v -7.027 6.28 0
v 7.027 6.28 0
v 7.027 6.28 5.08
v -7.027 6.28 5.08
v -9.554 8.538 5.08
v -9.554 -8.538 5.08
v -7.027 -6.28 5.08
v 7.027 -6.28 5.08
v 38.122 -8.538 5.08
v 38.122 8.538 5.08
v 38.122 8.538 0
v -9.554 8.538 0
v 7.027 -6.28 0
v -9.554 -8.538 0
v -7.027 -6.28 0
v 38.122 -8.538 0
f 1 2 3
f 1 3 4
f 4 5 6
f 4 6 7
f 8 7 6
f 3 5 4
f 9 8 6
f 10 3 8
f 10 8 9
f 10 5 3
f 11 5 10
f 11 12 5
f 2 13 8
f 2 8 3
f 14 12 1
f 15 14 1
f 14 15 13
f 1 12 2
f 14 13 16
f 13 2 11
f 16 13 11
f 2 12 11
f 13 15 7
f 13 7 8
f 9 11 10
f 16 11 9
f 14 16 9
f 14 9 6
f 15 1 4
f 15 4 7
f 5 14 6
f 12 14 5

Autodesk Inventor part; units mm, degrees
ref_plane "YZ Plane" through (0, 0, 0) normal (1, 0, 0) x (0, 1, 0)
ref_plane "XZ Plane" through (0, 0, 0) normal (0, 1, 0) x (-1, 0, 0)
ref_plane "XY Plane" through (0, 0, 0) normal (0, 0, 1) x (1, 0, 0)
sketch "Boceto1" plane through (0, 0, 0) normal (0, 0, 1) x (1, 0, 0)
  point P0 (0, 0)
sketch "Boceto2" plane through (0, 0, 0) normal (0, 0, 1) x (1, 0, 0)
  line L0 (-7.0268, -6.2798) -> (7.0268, -6.2798)
  line L1 (7.0268, -6.2798) -> (7.0268, 6.2798)
  line L2 (7.0268, 6.2798) -> (-7.0268, 6.2798)
  line L3 (-7.0268, 6.2798) -> (-7.0268, -6.2798)
  line L4 (-7.0268, -6.2798) -> (7.0268, 6.2798) construction
  line L5 (7.0268, -6.2798) -> (-7.0268, 6.2798) construction
  line L6 (-9.5542, -8.5385) -> (-9.5542, 8.5385)
  line L7 (-9.5542, 8.5385) -> (38.1222, 8.5385)
  line L8 (38.1222, 8.5385) -> (38.1222, -8.5385)
  line L9 (38.1222, -8.5385) -> (-9.5542, -8.5385)
  point P0 (0, 0)
extrude "Extrusión1" add sketch "Boceto2" along normal blind 5.08
